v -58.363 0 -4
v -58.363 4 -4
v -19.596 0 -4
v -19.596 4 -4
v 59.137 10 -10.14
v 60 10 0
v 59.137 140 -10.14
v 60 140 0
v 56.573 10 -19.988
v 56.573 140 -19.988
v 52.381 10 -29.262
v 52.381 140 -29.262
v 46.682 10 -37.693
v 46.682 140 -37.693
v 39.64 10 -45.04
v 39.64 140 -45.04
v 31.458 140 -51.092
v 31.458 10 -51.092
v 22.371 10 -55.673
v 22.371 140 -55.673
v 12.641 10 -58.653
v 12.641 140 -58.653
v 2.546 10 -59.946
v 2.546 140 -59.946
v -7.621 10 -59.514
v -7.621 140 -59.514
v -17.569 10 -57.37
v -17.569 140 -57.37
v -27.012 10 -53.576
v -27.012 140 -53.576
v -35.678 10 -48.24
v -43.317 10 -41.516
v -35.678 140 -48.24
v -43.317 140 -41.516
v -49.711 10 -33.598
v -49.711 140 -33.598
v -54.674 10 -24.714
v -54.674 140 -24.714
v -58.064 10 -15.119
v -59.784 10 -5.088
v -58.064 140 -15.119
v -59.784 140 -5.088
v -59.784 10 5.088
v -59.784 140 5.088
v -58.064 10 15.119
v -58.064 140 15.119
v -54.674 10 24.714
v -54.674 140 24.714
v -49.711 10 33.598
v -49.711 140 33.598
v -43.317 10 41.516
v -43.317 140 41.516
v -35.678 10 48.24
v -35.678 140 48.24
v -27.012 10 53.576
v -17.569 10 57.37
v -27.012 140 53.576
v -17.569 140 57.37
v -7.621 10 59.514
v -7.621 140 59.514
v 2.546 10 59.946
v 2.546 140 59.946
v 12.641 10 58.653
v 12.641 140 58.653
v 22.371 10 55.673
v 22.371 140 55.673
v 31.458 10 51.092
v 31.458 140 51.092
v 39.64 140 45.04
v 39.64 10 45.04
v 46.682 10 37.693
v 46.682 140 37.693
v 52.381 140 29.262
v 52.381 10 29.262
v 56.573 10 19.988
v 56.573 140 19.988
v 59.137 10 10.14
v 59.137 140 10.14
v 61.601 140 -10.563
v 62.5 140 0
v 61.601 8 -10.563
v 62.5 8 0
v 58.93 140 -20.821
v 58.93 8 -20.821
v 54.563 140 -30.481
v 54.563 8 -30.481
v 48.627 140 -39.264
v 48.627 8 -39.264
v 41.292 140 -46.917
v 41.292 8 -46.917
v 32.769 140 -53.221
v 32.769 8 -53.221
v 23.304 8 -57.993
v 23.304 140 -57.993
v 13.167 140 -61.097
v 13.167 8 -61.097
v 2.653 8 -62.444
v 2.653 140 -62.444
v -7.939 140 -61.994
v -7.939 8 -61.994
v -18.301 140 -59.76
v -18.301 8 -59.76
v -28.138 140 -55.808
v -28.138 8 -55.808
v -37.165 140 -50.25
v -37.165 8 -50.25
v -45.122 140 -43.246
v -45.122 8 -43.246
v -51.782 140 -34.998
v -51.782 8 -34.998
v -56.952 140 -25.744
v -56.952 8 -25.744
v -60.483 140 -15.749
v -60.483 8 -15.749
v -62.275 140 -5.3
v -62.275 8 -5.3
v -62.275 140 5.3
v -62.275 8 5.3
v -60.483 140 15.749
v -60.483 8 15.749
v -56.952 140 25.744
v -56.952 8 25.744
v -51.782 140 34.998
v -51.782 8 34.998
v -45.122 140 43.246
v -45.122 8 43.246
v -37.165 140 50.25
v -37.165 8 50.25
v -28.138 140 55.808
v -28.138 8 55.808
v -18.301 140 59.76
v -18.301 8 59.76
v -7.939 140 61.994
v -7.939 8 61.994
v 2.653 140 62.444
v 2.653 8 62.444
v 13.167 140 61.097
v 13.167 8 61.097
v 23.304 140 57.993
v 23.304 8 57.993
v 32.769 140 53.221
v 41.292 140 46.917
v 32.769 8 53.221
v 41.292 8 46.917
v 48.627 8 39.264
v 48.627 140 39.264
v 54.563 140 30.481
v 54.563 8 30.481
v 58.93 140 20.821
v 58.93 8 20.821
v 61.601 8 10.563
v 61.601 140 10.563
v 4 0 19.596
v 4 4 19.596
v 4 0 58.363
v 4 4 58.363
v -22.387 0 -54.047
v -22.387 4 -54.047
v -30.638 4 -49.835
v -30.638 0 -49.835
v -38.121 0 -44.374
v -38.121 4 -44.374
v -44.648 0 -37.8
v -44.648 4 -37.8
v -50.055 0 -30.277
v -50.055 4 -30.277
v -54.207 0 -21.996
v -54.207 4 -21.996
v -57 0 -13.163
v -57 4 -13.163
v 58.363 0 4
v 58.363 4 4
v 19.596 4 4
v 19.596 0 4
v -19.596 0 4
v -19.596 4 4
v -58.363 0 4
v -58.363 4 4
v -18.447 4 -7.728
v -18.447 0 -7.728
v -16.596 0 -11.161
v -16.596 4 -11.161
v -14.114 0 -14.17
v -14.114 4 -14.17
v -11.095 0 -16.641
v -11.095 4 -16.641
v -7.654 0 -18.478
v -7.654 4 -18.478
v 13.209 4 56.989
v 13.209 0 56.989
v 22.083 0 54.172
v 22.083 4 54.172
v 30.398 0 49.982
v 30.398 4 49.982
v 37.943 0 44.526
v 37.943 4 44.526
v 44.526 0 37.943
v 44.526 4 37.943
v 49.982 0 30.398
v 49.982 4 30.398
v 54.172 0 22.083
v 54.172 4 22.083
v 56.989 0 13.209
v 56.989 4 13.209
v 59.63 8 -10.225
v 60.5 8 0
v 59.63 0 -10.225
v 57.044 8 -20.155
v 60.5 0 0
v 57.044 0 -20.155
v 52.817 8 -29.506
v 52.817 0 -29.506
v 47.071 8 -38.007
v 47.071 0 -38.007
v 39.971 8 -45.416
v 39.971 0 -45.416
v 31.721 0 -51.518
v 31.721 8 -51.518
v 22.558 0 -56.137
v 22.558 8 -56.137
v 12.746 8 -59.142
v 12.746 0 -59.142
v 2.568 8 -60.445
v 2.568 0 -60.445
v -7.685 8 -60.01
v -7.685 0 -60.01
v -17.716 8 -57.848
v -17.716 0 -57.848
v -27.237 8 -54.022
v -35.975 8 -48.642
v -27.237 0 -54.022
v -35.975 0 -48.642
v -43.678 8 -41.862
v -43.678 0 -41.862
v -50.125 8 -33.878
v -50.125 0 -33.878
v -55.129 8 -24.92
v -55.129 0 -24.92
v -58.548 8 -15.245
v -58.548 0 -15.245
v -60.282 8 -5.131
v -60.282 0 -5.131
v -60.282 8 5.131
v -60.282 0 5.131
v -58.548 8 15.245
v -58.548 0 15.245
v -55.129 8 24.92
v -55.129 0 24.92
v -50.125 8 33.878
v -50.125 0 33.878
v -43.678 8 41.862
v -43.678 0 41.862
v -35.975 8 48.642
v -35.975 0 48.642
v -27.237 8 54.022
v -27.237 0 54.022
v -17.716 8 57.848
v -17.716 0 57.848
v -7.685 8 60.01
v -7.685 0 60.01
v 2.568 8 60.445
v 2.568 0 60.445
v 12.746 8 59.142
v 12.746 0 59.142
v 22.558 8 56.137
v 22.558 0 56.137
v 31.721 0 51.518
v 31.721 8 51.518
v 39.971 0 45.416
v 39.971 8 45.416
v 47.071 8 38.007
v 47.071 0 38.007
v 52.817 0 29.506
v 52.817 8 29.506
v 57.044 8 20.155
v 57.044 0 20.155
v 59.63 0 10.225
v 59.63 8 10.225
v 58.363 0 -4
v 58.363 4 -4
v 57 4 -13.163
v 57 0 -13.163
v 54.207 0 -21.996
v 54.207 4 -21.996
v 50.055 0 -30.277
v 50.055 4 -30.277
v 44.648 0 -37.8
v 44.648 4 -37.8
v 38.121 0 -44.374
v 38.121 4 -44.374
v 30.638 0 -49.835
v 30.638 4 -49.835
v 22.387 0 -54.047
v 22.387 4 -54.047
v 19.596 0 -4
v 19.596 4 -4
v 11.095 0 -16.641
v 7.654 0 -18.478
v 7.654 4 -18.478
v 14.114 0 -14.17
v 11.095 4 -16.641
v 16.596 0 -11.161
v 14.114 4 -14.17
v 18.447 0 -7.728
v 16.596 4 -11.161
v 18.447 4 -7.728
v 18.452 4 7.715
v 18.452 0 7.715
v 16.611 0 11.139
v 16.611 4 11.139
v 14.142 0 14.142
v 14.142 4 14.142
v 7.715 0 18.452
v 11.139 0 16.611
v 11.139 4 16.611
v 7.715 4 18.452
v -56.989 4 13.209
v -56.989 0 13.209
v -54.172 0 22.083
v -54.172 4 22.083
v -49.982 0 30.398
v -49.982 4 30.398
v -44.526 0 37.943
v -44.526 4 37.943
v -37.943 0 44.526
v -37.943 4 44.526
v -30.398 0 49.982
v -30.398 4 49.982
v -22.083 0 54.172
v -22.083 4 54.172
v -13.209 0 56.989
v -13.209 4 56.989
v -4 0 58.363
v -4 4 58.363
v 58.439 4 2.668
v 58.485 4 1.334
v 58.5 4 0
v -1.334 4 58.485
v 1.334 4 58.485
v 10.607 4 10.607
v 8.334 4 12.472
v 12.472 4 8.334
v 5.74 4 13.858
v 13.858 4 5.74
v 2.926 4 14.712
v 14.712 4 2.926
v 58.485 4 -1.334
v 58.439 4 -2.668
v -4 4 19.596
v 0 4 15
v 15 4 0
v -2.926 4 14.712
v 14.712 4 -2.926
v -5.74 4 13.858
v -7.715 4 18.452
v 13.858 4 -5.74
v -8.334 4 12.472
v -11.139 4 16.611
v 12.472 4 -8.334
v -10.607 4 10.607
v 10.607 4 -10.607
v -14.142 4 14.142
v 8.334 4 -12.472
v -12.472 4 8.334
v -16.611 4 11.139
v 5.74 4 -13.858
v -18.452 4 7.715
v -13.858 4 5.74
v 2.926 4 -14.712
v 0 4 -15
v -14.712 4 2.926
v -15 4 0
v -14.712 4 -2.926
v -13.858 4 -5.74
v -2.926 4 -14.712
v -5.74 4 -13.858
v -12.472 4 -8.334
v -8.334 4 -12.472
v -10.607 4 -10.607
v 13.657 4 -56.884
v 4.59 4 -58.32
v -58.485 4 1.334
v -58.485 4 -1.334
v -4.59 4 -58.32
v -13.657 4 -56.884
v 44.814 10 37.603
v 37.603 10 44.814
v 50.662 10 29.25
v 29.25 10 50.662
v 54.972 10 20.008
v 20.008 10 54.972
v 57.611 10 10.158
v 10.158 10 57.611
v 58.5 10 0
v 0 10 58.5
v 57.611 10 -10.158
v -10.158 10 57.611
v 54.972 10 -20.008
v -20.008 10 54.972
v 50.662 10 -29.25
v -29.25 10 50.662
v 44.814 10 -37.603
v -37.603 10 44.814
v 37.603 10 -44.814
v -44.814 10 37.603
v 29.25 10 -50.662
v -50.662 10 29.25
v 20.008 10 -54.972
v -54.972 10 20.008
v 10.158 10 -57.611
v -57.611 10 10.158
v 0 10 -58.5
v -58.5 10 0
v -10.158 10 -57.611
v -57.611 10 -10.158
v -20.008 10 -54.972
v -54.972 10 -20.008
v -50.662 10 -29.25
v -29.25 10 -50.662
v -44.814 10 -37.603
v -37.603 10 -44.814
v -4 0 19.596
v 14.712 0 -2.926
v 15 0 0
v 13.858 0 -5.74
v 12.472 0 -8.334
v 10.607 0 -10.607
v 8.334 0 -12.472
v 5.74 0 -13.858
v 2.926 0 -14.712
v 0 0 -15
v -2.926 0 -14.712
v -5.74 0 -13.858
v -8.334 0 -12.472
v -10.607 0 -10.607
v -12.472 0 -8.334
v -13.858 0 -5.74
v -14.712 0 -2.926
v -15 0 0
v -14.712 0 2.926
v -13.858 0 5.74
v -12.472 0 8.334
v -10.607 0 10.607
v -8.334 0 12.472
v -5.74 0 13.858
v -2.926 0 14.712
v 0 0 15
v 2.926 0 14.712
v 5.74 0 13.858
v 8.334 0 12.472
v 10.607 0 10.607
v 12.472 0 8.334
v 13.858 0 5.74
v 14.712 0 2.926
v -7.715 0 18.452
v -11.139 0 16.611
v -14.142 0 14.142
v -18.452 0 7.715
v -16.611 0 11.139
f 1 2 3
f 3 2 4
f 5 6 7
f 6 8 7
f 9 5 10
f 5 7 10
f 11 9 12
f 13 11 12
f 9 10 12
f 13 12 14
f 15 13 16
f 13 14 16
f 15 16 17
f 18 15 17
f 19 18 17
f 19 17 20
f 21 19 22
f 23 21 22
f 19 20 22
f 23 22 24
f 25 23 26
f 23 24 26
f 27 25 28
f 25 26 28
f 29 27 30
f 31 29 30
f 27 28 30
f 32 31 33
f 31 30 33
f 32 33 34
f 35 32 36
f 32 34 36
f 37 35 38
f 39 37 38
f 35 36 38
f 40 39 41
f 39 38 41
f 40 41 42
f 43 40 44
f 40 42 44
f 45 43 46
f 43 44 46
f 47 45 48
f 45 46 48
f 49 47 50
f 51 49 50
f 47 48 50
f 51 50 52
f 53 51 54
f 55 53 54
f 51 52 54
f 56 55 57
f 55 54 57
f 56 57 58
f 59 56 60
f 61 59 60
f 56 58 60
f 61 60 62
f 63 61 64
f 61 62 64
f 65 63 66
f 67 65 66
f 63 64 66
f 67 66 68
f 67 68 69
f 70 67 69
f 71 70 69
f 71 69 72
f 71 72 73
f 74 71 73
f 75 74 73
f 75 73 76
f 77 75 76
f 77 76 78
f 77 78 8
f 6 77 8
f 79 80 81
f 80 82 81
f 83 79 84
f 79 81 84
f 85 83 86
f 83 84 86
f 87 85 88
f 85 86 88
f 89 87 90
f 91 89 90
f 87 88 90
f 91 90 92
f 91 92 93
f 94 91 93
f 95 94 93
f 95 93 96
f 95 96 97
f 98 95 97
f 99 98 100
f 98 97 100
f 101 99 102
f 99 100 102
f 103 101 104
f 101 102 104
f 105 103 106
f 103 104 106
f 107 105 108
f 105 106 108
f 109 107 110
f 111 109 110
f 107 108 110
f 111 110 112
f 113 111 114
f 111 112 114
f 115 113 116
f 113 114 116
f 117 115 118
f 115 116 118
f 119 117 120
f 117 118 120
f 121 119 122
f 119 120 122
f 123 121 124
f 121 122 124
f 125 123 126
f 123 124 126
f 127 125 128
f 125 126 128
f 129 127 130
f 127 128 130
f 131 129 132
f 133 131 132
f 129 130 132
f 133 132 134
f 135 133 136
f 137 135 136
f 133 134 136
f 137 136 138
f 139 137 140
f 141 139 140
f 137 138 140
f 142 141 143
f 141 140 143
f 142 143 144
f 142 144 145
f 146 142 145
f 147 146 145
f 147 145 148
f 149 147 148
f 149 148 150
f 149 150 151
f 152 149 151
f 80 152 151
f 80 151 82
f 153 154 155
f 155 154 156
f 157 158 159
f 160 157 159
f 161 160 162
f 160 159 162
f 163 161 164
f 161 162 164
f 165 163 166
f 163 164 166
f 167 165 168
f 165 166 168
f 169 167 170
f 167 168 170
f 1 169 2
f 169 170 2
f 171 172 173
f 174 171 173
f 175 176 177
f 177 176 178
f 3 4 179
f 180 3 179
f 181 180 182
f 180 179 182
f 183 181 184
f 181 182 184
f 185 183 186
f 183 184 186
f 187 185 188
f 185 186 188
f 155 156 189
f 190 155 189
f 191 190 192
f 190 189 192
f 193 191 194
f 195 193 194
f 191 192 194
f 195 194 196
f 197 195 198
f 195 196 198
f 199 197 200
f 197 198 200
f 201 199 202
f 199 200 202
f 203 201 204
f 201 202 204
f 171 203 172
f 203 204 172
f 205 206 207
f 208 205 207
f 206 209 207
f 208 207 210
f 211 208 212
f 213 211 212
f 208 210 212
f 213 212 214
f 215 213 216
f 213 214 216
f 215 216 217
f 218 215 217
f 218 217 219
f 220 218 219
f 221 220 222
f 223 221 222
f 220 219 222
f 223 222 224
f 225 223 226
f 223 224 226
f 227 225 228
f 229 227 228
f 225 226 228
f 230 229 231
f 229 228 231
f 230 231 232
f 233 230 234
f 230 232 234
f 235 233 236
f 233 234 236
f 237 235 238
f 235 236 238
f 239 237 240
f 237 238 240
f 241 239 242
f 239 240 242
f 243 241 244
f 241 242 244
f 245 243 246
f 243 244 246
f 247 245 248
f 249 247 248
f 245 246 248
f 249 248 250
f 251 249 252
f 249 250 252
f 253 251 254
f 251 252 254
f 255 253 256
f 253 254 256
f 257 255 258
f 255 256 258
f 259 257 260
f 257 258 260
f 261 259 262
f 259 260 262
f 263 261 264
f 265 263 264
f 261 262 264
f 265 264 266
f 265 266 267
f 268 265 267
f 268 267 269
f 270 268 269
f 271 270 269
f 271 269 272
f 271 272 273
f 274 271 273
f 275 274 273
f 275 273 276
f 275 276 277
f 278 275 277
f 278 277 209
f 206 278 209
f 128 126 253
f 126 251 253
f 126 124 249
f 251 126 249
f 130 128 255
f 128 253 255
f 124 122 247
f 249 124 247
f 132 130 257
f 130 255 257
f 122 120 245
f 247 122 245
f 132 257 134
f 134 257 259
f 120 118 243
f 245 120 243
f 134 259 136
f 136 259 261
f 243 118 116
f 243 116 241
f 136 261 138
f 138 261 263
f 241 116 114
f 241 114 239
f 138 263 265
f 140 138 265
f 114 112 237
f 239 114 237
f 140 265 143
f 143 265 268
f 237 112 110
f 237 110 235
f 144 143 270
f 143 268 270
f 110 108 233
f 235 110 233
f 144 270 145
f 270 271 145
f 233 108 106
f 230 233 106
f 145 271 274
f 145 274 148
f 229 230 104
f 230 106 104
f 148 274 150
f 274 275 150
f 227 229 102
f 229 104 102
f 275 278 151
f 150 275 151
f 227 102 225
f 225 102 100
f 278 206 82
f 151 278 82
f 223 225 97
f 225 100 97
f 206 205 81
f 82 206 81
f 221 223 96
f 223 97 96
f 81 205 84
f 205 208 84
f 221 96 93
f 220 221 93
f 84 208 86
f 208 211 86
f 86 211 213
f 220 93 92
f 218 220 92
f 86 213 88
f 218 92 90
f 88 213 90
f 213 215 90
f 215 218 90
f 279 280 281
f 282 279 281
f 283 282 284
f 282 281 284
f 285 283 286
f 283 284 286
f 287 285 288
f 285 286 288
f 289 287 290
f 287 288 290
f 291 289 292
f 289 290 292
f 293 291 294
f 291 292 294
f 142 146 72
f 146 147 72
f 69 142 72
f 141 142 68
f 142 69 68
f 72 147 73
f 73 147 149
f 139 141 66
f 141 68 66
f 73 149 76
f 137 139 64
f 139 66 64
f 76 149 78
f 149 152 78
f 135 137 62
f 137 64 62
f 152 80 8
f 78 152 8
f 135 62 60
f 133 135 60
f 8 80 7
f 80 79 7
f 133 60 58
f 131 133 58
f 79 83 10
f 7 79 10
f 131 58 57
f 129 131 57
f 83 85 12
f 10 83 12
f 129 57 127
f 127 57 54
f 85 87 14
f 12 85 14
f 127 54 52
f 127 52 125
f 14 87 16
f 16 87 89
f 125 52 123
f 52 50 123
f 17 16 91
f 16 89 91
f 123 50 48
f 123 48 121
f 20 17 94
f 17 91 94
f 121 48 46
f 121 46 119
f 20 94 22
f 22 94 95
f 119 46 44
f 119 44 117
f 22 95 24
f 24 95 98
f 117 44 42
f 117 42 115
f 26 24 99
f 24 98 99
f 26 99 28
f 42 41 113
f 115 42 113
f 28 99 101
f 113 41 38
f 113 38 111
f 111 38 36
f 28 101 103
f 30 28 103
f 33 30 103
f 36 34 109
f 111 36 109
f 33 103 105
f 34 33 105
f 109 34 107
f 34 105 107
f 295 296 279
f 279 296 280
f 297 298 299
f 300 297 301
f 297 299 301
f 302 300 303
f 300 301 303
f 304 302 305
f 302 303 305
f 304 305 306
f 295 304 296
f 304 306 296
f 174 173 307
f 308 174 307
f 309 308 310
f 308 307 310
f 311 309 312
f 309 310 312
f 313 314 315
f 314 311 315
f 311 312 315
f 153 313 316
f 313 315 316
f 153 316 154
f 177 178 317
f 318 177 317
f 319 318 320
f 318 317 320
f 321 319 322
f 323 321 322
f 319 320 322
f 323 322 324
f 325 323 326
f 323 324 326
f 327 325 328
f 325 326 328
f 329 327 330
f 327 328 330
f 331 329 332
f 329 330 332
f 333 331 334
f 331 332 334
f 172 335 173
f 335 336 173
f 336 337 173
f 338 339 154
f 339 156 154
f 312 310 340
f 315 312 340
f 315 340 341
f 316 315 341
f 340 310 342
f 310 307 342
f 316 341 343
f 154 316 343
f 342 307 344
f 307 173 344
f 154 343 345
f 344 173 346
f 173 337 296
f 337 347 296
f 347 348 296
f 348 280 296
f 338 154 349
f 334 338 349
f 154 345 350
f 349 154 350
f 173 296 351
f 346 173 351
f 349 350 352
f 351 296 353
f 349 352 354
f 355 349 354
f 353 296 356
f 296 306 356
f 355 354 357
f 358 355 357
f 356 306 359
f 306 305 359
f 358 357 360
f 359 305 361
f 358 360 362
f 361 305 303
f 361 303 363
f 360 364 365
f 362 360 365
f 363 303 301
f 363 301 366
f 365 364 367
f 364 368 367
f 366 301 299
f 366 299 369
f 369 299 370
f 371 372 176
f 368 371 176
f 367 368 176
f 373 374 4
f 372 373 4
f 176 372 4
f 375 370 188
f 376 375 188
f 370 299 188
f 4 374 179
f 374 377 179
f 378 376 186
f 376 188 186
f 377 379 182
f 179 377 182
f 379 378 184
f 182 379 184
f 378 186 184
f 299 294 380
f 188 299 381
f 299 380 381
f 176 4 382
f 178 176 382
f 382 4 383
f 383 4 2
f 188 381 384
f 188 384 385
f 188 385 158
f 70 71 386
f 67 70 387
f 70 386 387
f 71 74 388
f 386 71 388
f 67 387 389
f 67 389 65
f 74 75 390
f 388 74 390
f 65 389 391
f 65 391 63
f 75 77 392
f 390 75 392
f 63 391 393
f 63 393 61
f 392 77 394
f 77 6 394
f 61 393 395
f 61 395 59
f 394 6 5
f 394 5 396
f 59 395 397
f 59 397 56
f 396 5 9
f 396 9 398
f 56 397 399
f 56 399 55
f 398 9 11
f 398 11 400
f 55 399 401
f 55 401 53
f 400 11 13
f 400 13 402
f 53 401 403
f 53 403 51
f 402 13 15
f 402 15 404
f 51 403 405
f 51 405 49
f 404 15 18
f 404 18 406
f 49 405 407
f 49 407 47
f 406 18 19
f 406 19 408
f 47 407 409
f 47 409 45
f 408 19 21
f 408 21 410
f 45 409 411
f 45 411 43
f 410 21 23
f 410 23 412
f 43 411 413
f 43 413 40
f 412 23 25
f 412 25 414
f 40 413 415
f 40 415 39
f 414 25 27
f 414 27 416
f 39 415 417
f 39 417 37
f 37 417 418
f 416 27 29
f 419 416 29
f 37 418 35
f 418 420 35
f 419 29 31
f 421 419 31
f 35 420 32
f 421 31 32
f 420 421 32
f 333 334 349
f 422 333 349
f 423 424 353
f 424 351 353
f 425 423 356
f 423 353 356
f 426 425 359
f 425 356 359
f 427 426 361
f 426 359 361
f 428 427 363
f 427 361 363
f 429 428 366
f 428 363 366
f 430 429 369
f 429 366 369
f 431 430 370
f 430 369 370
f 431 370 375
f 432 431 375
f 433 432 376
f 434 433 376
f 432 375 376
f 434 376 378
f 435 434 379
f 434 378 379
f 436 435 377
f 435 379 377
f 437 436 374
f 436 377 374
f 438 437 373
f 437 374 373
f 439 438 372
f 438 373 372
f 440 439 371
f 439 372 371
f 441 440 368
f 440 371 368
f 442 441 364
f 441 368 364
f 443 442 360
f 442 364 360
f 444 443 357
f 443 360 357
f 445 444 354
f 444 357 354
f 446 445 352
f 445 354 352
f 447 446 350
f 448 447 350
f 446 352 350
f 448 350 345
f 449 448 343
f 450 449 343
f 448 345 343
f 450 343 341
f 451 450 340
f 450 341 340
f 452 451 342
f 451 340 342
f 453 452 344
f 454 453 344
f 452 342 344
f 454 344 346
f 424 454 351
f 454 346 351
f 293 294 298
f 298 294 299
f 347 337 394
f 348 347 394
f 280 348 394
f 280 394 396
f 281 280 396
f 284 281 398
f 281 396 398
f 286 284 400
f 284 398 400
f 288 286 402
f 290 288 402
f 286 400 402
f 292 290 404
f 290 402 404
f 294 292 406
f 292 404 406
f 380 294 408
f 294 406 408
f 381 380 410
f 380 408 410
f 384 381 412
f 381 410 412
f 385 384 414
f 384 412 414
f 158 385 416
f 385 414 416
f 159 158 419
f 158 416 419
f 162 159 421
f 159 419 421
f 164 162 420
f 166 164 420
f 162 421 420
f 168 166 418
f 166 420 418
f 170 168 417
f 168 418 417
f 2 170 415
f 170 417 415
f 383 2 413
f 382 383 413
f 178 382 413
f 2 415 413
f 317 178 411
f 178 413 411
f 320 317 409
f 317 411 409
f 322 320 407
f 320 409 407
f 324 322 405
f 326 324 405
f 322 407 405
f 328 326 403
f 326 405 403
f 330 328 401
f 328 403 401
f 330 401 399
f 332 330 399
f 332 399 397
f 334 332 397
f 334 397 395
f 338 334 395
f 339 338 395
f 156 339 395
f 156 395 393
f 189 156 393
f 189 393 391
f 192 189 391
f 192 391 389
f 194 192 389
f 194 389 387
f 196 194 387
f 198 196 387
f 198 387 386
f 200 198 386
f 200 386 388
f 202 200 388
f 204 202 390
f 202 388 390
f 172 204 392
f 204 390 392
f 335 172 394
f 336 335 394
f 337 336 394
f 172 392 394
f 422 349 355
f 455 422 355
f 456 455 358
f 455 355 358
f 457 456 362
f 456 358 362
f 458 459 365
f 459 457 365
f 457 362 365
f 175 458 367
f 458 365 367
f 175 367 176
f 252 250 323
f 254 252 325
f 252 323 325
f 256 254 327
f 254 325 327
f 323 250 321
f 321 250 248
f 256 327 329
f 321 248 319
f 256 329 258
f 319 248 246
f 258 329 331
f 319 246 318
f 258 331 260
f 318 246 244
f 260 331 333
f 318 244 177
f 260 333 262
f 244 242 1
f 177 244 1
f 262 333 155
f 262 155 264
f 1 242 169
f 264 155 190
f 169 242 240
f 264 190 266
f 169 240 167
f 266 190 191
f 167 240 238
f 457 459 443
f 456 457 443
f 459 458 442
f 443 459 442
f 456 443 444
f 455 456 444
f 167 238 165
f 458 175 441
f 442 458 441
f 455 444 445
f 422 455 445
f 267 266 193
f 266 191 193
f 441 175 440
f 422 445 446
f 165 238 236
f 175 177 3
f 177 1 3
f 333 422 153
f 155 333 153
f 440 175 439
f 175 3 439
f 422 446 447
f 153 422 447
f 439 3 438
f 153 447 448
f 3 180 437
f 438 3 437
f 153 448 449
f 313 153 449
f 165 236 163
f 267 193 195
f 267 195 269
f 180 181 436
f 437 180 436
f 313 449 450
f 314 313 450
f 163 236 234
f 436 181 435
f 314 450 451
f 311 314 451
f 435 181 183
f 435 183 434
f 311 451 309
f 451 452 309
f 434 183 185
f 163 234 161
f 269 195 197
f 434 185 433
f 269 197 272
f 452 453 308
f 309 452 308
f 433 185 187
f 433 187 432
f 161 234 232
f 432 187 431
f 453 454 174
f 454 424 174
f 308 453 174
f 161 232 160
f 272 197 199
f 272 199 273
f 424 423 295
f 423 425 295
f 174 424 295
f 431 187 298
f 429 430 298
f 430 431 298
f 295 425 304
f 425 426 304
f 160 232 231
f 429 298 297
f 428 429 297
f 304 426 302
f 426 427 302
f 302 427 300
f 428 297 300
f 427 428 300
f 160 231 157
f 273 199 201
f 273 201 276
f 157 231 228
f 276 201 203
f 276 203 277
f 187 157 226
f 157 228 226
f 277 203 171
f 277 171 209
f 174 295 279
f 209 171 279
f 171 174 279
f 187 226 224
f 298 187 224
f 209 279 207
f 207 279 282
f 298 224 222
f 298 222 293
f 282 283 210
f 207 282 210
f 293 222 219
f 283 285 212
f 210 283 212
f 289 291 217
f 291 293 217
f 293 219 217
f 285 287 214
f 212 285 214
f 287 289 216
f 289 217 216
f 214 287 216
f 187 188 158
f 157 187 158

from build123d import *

# Parameters (mm, degrees)
CUT_EXTRUDE1_DEPTH = 10


with BuildPart() as part:
    # Sketch1 → Revolve1 (revolve)
    with BuildSketch(Plane.XY):
        Polygon((60.5, 0), (15, 0), (15, 4), (58.5, 4), (58.5, 10), (60, 10), (60, 140), (62.5, 140), (62.5, 8), (60.5, 8), align=None)
    revolve(axis=Axis((0, 0, 0), (0, 1, 0)))

    # Sketch2 → Cut-Extrude1 (cut)
    with BuildSketch(Plane(origin=(0, 4, 0), x_dir=(1, 0, 0), z_dir=(0, 1, 0))):
        with BuildLine():
            ThreePointArc((19.595917942, -4), (14.142135624, -14.142135624), (4, -19.595917942))
            Line((4, -19.595917942), (4, -58.36308765))
            ThreePointArc((4, -58.36308765), (41.365746699, -41.365746699), (58.36308765, -4))
            Line((58.36308765, -4), (19.595917942, -4))
        make_face()
        with BuildLine():
            Line((22.386980793, 54.046952652), (7.653668647, 18.47759065))
            ThreePointArc((7.653668647, 18.47759065), (15.428387799, 12.726541161), (19.595917942, 4))
            Line((19.595917942, 4), (58.36308765, 4))
            ThreePointArc((58.36308765, 4), (47.500713214, 34.145750016), (22.386980793, 54.046952652))
        make_face()
        with BuildLine():
            ThreePointArc((-19.595917942, 4), (-15.428387799, 12.726541161), (-7.653668647, 18.47759065))
            Line((-7.653668647, 18.47759065), (-22.386980793, 54.046952652))
            ThreePointArc((-22.386980793, 54.046952652), (-47.500713214, 34.145750016), (-58.36308765, 4))
            Line((-58.36308765, 4), (-19.595917942, 4))
        make_face()
        with BuildLine():
            Line((-4, -58.36308765), (-4, -19.595917942))
            ThreePointArc((-4, -19.595917942), (-14.142135624, -14.142135624), (-19.595917942, -4))
            Line((-19.595917942, -4), (-58.36308765, -4))
            ThreePointArc((-58.36308765, -4), (-41.365746699, -41.365746699), (-4, -58.36308765))
        make_face()
    extrude(amount=-CUT_EXTRUDE1_DEPTH, mode=Mode.SUBTRACT)


solid = part.part
